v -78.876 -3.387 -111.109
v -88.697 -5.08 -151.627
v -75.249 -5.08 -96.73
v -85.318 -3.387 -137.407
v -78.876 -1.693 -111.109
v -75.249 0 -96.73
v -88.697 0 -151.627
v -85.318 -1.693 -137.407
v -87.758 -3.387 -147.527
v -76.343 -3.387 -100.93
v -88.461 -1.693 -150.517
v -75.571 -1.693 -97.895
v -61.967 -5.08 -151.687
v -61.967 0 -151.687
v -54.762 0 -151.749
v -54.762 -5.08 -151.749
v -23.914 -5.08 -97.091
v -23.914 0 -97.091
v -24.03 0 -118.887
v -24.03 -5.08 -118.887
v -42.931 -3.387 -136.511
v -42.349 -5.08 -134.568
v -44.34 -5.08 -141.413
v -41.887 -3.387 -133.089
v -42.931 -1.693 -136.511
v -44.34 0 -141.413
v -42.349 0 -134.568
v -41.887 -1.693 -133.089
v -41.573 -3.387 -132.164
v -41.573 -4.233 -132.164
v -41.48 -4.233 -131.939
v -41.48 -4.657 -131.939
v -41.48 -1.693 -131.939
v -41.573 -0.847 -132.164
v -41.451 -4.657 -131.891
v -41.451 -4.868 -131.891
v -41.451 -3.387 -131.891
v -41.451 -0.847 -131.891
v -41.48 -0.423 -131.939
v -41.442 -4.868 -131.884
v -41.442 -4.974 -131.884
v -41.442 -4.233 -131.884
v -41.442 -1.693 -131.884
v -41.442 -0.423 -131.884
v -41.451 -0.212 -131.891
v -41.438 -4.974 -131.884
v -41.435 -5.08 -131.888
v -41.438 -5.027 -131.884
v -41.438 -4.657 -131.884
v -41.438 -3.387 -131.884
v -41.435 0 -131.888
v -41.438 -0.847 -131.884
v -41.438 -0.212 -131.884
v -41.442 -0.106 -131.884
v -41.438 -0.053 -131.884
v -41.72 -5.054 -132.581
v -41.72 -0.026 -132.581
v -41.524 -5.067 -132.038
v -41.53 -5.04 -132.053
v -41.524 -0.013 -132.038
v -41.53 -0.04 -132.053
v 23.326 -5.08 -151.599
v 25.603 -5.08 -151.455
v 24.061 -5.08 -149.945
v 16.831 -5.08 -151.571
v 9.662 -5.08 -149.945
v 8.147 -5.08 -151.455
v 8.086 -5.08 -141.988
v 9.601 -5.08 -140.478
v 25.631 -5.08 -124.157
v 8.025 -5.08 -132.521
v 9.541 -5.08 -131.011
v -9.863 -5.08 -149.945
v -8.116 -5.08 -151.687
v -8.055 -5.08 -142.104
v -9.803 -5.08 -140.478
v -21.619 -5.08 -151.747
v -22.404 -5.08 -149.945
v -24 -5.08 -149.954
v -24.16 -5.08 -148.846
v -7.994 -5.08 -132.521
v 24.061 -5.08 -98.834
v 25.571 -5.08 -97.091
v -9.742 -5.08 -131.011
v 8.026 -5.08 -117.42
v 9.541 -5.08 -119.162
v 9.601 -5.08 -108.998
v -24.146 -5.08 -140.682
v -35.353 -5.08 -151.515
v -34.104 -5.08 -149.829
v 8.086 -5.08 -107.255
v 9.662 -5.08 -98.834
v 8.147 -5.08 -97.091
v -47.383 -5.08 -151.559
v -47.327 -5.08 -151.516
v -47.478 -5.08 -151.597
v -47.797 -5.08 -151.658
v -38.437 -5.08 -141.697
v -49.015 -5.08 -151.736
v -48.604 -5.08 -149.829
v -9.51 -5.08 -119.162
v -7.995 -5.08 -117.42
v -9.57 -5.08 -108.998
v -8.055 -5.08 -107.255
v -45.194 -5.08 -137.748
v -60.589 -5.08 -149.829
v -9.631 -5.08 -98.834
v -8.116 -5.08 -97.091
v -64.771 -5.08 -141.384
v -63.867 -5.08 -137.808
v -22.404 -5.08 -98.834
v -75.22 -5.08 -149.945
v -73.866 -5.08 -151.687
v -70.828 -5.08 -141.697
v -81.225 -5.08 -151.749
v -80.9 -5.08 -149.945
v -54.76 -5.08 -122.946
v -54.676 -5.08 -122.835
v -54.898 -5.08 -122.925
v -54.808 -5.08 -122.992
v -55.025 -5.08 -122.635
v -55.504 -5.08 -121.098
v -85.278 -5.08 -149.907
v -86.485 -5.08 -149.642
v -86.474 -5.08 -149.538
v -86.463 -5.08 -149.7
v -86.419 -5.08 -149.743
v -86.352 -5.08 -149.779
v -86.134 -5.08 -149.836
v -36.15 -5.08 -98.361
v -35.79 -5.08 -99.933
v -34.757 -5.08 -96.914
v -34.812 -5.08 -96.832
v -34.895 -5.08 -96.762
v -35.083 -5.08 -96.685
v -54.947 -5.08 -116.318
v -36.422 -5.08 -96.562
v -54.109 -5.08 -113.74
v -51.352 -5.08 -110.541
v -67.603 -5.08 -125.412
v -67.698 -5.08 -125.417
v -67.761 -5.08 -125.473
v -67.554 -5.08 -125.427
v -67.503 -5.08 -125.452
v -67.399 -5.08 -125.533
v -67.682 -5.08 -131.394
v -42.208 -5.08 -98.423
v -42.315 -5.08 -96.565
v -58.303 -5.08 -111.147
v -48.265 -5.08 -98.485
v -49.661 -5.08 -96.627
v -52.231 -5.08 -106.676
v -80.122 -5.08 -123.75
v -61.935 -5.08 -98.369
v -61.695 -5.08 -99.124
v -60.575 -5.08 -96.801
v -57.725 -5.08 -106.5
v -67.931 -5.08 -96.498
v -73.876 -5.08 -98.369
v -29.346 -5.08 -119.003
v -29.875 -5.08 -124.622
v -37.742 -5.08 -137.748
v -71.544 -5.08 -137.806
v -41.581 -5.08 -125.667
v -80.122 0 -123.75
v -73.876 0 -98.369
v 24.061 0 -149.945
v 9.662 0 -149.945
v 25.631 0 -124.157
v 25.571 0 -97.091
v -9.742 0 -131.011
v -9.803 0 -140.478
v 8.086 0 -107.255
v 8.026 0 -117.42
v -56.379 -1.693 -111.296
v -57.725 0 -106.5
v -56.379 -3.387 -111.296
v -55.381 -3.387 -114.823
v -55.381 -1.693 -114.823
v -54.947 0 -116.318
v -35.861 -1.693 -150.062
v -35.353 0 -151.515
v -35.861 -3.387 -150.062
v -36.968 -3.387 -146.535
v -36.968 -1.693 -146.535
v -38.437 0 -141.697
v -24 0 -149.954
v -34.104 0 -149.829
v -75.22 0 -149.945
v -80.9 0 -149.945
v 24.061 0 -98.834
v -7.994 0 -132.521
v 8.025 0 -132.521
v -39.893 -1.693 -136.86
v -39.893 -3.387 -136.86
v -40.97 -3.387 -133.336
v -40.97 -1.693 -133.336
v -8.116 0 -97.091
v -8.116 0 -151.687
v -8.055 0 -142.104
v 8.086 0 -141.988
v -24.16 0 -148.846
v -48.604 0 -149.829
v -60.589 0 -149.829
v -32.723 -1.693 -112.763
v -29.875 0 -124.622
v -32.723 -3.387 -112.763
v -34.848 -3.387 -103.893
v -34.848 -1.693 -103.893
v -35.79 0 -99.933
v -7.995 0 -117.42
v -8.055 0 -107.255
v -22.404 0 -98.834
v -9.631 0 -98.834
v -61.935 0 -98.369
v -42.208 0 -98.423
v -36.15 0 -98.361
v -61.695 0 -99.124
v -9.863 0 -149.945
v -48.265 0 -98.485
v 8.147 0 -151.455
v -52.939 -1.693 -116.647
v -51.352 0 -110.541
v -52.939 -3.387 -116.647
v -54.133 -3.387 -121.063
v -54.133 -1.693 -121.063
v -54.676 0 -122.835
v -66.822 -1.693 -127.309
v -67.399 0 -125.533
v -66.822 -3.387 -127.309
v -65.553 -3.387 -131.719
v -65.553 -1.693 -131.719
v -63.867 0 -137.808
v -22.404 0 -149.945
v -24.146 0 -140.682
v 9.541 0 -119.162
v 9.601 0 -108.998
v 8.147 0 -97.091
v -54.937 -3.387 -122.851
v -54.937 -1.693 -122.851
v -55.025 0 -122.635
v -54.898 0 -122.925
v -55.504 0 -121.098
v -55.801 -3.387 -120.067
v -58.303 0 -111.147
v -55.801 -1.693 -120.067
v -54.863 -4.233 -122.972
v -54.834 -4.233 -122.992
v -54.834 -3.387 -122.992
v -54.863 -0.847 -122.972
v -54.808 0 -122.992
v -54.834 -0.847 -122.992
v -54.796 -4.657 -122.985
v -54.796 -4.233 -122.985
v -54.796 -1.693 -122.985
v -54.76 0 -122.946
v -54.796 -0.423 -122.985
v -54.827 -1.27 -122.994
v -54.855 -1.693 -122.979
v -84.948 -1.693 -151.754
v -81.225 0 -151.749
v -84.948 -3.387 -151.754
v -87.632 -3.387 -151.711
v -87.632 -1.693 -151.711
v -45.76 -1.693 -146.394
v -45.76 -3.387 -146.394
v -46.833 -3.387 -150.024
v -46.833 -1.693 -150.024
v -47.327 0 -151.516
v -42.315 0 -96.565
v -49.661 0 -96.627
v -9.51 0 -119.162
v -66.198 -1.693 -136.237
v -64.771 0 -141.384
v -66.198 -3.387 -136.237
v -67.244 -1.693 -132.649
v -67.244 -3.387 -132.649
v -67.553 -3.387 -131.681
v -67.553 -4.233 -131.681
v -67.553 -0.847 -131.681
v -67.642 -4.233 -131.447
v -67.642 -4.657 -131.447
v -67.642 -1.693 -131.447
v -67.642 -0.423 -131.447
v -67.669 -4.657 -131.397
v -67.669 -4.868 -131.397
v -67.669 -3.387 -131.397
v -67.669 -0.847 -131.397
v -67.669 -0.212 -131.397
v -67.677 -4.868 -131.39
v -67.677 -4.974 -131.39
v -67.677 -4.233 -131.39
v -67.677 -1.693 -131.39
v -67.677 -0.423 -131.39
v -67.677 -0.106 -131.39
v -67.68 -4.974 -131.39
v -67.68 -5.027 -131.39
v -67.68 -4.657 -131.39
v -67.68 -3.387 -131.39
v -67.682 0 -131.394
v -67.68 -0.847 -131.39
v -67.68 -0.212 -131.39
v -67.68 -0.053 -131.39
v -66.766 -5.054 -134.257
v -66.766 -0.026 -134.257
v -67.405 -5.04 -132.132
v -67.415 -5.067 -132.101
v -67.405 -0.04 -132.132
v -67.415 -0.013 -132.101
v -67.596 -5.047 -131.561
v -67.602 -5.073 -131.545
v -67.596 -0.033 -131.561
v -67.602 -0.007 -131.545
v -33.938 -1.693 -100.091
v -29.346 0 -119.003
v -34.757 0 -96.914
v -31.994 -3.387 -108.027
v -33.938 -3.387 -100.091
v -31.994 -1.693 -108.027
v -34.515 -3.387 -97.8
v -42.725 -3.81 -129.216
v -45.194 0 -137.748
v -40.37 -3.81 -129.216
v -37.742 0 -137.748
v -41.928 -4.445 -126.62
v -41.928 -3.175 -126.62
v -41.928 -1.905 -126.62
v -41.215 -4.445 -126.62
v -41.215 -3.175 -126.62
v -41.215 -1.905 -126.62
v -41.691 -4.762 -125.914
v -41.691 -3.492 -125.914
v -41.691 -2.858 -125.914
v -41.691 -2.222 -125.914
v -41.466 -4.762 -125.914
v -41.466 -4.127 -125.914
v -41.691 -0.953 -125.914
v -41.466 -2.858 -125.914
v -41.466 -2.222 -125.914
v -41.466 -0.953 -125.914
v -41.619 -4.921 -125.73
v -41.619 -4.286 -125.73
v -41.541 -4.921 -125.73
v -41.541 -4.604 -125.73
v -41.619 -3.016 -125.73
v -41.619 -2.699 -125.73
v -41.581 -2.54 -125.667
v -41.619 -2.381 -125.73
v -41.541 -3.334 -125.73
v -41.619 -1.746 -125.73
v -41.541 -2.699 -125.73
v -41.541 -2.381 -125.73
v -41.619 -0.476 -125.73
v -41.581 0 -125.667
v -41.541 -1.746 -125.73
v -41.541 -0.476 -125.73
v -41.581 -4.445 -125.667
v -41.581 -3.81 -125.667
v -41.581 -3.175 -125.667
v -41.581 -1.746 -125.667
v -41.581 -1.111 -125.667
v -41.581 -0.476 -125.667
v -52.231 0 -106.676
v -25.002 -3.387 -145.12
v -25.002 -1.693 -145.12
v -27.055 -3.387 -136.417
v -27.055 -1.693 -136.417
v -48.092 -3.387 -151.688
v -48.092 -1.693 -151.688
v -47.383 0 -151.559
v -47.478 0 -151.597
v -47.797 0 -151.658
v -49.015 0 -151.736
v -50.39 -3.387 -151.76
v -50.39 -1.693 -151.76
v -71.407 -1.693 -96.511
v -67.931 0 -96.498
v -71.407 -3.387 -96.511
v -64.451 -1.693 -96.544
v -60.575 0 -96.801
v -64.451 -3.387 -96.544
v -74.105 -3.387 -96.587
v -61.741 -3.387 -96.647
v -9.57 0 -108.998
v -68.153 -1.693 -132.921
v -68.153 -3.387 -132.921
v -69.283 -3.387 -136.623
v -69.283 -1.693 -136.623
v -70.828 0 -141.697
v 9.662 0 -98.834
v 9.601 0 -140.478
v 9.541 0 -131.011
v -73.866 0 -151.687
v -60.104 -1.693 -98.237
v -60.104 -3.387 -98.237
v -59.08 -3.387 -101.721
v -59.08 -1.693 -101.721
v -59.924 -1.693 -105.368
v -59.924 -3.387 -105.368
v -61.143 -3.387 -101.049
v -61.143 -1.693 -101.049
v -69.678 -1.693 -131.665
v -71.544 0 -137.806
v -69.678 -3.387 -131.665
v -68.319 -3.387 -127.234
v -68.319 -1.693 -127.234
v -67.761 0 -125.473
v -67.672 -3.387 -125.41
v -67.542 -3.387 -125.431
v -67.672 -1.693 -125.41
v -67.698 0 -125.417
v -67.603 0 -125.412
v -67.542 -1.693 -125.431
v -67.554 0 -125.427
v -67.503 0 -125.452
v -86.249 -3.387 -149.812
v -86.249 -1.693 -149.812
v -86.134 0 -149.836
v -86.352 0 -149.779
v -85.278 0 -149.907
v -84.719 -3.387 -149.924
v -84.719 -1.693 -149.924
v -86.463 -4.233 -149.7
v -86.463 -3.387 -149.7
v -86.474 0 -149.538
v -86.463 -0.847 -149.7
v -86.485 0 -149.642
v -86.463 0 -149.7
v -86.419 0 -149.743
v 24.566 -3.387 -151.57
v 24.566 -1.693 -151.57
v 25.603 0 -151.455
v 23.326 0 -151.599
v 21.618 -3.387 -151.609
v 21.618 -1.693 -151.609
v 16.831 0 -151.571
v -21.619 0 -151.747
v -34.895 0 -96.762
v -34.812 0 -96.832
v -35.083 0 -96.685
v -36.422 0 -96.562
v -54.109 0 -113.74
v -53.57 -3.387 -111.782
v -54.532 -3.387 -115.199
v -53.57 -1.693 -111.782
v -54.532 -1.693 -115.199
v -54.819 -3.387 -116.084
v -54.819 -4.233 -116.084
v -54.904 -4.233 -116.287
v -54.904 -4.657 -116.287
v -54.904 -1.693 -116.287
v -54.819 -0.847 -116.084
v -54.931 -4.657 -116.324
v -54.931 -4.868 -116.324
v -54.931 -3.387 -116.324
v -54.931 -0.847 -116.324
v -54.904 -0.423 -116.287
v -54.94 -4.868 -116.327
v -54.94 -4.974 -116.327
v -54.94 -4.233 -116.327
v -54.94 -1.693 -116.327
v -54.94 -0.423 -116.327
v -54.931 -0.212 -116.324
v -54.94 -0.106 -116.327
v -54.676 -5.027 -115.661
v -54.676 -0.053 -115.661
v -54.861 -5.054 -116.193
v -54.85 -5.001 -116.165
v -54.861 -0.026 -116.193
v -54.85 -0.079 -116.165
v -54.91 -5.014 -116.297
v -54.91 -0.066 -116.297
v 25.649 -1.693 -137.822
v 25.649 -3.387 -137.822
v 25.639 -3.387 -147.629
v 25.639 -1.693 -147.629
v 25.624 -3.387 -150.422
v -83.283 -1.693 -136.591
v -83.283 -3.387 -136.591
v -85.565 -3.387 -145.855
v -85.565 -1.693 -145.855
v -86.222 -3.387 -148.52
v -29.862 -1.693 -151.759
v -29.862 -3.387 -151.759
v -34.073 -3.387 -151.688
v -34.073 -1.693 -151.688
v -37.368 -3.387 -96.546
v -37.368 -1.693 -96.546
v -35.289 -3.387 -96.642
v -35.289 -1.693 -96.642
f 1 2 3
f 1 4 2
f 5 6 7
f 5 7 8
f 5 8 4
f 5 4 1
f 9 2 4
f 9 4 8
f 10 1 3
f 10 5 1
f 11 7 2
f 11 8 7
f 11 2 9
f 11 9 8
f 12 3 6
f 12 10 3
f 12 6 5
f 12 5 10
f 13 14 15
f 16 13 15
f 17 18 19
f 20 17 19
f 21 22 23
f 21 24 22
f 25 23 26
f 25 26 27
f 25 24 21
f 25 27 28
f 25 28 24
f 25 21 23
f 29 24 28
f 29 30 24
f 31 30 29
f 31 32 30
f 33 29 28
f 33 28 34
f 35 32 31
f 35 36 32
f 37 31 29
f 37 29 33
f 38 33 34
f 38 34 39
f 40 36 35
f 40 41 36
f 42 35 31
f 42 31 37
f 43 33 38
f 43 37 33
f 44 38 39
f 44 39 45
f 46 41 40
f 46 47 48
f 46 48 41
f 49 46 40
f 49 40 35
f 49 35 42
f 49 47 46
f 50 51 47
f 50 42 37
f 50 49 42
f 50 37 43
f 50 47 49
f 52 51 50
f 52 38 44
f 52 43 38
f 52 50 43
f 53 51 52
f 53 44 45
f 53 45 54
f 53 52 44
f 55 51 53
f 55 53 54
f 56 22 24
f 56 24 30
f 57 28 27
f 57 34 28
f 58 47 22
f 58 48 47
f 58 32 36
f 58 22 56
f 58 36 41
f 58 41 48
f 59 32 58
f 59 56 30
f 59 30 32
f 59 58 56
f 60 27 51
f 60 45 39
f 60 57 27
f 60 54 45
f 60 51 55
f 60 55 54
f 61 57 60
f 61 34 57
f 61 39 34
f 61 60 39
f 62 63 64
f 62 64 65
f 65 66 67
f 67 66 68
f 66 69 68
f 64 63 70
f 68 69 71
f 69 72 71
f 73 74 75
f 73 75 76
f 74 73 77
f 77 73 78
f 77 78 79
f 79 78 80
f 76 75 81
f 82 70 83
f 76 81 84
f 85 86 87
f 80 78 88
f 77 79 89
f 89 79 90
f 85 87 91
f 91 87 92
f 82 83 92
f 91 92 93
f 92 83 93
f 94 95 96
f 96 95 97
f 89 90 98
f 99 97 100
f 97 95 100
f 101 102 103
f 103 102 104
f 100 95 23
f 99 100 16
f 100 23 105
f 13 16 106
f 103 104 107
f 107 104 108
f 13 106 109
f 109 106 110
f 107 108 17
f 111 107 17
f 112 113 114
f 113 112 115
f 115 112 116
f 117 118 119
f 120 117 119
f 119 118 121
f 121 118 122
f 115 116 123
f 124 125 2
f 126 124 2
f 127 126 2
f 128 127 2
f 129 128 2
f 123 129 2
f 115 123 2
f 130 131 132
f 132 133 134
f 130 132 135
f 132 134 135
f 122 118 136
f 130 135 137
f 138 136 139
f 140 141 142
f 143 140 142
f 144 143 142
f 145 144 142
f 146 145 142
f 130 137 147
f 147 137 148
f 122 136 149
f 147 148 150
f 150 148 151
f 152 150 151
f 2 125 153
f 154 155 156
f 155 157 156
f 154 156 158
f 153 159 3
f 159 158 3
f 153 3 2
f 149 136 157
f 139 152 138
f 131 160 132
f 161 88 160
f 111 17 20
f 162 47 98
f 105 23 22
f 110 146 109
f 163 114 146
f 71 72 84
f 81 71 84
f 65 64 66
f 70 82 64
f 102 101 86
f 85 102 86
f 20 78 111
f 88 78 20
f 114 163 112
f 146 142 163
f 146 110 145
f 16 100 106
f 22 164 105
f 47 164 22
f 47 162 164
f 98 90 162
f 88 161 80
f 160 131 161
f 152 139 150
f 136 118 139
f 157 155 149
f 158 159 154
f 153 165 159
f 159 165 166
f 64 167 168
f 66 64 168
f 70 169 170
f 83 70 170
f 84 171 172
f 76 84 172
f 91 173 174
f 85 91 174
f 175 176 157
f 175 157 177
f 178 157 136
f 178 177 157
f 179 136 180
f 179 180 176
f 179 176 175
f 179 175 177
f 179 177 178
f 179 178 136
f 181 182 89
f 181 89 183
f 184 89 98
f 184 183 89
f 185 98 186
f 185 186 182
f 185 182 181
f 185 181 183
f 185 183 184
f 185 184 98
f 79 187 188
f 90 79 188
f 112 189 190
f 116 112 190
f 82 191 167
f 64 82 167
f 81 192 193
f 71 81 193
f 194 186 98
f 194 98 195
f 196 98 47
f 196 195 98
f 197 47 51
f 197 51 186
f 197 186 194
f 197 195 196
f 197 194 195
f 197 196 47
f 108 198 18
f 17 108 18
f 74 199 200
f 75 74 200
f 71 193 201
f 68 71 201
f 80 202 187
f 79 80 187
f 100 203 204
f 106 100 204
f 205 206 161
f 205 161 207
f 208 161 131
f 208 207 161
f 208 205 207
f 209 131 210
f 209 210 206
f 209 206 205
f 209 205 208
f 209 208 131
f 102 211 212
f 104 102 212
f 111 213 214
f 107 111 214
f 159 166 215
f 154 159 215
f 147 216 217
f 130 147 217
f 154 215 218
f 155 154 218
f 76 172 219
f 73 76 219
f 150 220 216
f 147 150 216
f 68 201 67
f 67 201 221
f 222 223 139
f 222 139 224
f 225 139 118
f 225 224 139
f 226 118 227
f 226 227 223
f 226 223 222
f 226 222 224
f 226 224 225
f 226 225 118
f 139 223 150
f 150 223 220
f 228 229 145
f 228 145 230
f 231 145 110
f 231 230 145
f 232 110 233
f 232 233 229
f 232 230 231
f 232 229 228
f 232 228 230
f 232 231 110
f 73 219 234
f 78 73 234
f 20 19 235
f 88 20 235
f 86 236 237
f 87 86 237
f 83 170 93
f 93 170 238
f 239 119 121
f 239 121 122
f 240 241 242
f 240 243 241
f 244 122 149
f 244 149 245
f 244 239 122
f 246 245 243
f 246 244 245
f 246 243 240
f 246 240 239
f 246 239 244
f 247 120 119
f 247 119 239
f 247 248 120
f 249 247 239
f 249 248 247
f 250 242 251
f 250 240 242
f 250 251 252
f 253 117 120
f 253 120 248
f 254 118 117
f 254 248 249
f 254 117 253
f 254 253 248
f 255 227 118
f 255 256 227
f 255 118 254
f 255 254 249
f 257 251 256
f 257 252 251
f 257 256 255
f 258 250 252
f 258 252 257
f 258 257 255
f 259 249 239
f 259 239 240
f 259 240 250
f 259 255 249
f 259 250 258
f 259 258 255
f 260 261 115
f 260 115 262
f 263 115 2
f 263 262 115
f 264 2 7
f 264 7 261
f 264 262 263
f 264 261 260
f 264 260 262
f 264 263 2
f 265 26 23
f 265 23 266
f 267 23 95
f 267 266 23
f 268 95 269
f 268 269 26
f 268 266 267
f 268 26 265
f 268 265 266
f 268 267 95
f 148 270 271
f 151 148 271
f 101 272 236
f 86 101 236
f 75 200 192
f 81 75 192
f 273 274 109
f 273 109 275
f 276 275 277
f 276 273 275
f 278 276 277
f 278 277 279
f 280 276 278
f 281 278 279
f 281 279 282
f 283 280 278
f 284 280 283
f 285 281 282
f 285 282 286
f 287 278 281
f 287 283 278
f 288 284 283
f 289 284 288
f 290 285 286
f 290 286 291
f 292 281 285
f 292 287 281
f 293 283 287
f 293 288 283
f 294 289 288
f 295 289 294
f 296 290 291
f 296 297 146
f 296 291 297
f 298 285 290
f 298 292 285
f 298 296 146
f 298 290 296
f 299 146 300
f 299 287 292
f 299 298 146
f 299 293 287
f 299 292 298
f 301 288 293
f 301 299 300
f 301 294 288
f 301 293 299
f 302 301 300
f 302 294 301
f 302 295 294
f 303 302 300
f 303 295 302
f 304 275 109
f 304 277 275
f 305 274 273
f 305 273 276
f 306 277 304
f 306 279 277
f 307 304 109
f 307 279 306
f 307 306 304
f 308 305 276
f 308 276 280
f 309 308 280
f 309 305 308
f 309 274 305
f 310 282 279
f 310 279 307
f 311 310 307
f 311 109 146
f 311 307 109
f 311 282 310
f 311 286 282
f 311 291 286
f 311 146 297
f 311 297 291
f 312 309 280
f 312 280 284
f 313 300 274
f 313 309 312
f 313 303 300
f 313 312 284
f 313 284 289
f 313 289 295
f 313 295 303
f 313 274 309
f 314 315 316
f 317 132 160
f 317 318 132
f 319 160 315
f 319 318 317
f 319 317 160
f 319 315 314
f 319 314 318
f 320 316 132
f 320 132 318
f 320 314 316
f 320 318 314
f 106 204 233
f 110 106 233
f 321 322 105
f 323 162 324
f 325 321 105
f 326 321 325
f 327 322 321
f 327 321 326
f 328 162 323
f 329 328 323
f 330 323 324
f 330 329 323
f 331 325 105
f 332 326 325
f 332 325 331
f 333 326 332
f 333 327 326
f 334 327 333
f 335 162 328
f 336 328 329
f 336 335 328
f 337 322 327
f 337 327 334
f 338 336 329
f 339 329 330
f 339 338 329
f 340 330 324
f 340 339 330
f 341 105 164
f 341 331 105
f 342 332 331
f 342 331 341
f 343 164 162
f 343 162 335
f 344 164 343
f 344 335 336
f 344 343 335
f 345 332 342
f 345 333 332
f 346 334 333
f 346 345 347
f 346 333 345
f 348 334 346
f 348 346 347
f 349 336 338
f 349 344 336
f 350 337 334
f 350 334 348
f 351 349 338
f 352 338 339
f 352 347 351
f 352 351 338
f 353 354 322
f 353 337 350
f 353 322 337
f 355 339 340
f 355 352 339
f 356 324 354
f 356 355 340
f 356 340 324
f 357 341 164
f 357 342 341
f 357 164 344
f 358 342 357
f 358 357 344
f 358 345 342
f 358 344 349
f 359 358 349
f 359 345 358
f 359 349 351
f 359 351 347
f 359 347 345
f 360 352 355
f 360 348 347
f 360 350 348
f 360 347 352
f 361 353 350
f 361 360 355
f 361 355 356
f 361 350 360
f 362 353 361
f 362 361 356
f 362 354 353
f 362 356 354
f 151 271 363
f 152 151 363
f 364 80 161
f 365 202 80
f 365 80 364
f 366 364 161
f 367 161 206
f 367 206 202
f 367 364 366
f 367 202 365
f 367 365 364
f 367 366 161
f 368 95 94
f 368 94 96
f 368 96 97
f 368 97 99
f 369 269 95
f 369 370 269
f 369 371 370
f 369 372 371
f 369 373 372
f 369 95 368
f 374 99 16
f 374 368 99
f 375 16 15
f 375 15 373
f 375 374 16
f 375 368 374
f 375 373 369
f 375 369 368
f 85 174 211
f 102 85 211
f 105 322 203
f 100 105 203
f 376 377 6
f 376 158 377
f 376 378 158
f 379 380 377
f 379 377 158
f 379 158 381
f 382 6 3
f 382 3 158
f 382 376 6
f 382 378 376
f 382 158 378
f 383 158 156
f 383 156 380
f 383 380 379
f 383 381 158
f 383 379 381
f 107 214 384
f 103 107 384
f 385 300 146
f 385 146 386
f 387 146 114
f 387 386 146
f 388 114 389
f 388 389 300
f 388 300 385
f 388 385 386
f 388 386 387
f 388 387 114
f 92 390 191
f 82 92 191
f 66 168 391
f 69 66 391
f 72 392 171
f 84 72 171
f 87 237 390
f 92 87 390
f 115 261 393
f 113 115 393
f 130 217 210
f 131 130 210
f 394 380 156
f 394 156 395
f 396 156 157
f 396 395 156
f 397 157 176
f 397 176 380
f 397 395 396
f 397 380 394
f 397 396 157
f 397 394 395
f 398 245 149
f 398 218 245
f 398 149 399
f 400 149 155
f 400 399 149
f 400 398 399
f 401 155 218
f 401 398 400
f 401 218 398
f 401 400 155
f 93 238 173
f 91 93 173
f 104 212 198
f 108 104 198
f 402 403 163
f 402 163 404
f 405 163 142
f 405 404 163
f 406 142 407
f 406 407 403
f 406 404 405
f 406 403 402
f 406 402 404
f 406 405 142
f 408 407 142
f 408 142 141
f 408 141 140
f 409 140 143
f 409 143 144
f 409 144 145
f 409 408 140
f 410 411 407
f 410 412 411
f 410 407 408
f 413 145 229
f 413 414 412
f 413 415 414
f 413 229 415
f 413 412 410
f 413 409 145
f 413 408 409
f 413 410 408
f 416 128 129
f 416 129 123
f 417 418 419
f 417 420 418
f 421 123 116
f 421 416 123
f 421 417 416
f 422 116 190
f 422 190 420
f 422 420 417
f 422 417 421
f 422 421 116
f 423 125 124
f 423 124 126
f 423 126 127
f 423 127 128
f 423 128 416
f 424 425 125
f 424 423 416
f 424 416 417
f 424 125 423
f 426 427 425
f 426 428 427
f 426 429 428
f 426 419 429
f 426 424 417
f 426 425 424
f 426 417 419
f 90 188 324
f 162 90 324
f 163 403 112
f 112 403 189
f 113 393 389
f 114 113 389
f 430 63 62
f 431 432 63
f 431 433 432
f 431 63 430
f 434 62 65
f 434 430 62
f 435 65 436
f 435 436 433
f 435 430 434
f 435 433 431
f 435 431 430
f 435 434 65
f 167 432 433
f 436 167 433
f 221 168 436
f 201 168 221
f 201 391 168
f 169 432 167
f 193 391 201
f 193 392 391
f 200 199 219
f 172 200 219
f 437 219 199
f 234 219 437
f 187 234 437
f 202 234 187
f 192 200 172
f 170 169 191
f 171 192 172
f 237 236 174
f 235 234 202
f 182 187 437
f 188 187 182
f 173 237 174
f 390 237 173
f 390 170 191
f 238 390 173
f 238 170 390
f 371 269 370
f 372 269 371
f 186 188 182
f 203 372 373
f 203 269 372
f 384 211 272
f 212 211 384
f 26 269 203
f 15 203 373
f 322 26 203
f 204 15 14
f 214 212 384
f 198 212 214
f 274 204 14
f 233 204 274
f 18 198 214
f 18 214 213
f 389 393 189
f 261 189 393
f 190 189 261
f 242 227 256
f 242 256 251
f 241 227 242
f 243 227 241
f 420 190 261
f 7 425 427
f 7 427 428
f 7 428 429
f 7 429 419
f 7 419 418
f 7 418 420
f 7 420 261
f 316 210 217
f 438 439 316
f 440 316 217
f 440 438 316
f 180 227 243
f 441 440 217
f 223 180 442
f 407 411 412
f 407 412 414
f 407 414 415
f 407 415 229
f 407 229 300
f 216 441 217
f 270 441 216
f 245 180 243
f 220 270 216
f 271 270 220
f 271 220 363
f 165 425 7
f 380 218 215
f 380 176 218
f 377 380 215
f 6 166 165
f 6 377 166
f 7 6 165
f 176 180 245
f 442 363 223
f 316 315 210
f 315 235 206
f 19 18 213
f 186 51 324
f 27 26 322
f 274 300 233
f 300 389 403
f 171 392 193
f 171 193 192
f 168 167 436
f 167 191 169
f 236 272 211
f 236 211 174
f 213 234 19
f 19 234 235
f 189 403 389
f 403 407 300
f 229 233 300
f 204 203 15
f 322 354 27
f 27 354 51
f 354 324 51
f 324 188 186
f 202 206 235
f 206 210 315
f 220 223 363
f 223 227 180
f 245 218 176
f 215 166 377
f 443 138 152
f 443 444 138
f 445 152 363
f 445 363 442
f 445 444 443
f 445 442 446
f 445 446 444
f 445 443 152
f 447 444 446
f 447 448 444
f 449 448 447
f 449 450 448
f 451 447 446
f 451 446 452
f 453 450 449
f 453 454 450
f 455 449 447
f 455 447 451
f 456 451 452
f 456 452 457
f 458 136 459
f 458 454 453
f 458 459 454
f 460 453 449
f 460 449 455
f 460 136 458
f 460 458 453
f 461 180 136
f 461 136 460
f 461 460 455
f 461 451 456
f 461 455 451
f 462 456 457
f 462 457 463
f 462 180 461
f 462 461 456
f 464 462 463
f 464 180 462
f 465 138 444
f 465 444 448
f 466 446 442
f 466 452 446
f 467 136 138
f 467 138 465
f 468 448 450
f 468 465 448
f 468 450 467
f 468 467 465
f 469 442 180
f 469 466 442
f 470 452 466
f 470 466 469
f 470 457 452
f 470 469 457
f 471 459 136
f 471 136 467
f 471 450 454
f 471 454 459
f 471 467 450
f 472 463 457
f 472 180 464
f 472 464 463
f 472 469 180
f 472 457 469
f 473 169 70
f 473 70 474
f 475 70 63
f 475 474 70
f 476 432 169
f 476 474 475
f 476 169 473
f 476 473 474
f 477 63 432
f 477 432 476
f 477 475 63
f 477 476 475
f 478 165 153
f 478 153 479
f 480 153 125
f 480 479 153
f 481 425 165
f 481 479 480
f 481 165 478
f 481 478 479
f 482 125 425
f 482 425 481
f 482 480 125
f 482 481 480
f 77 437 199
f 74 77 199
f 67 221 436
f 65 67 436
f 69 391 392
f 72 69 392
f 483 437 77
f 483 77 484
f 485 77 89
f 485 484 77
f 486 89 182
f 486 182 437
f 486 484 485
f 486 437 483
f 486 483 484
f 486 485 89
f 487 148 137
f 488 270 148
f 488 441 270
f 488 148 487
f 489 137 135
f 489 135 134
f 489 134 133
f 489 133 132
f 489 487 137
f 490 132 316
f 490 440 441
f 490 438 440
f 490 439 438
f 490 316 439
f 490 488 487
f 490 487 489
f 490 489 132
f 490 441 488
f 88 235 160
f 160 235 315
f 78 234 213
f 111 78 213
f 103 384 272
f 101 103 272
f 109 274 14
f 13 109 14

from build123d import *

# Parameters (mm, degrees)
F1_DEPTH = 5.08


with BuildPart() as f1:
    # F0 (on Front) → F1 (new body)
    with BuildSketch(Plane.XZ):
        with BuildLine():
            add(Edge.make_bspline(
                [(-88.697367137, -151.6268995181), (-88.8096869402, -151.4451622066), (-75.5090993087, -97.1505766968), (-75.2492718061, -96.7301671852)],
                knots=[0, 0, 0, 0, 1, 1, 1, 1], degree=3))
            add(Edge.make_bspline(
                [(-81.2252771404, -151.7485828201), (-85.2727205926, -151.7823095151), (-88.6351599598, -151.727558088), (-88.697367137, -151.6268995181)],
                knots=[0, 0, 0, 0, 1, 1, 1, 1], degree=3))
            Line((-81.2252771404, -151.7485828201), (-73.8662922876, -151.6872587675))
            Line((-73.8662922876, -151.6872587675), (-70.8277989917, -141.6973681422))
            add(Edge.make_bspline(
                [(-67.6823091824, -131.3943521191), (-67.7411591055, -131.5665717782), (-69.1566280625, -136.202929372), (-70.8277989917, -141.6973681422)],
                knots=[0, 0, 0, 0, 1, 1, 1, 1], degree=3))
            add(Edge.make_bspline(
                [(-64.7710364528, -141.3842427444), (-66.3133869912, -135.7175812475), (-67.6234592594, -131.2221309262), (-67.6823091824, -131.3943521191)],
                knots=[0, 0, 0, 0, 1, 1, 1, 1], degree=3))
            Line((-64.7710364528, -141.3842427444), (-61.9667602367, -151.6872587675))
            Line((-61.9667602367, -151.6872587675), (-54.7617960796, -151.7486058281))
            add(Edge.make_bspline(
                [(-47.327106009, -151.5162830756), (-47.50533383, -151.7441177296), (-49.1720212624, -151.796198692), (-54.7617960796, -151.7486058281)],
                knots=[0, 0, 0, 0, 1, 1, 1, 1], degree=3))
            add(Edge.make_bspline(
                [(-44.3397073984, -141.4129659612), (-45.8564269984, -146.8082708266), (-47.2007536122, -151.3547652154), (-47.327106009, -151.5162830756)],
                knots=[0, 0, 0, 0, 1, 1, 1, 1], degree=3))
            add(Edge.make_bspline(
                [(-41.434975083, -131.8877223747), (-41.5158590234, -131.7313015586), (-42.8229893322, -136.0176626297), (-44.3397073984, -141.4129659612)],
                knots=[0, 0, 0, 0, 1, 1, 1, 1], degree=3))
            add(Edge.make_bspline(
                [(-38.4365004097, -141.6973681422), (-40.0047779231, -136.4584856268), (-41.3540942103, -132.0441447246), (-41.434975083, -131.8877223747)],
                knots=[0, 0, 0, 0, 1, 1, 1, 1], degree=3))
            add(Edge.make_bspline(
                [(-35.35325344, -151.5148749846), (-35.4807623735, -151.3541301939), (-36.8682228963, -146.9362537254), (-38.4365004097, -141.6973681422)],
                knots=[0, 0, 0, 0, 1, 1, 1, 1], degree=3))
            add(Edge.make_bspline(
                [(-21.618593749, -151.747197737), (-32.2466686649, -151.7943779904), (-35.1707783378, -151.744881596), (-35.35325344, -151.5148749846)],
                knots=[0, 0, 0, 0, 1, 1, 1, 1], degree=3))
            Line((-21.618593749, -151.747197737), (-8.1157690404, -151.6872587675))
            Line((-8.1157690404, -151.6872587675), (-8.0551122205, -142.1039337259))
            Line((-8.0551122205, -142.1039337259), (-7.994452333, -132.5206102182))
            Line((-7.994452333, -132.5206102182), (0.0155073543, -132.5206102182))
            Line((0.0155073543, -132.5206102182), (8.0254655077, -132.5206102182))
            Line((8.0254655077, -132.5206102182), (8.0861545387, -141.9877738836))
            Line((8.0861545387, -141.9877738836), (8.1468328327, -151.4549360151))
            Line((8.1468328327, -151.4549360151), (16.8305932312, -151.5710973913))
            add(Edge.make_bspline(
                [(25.602503504, -151.4549360151), (25.5448131854, -151.6069745696), (22.5134799865, -151.6471159016), (16.8305932312, -151.5710973913)],
                knots=[0, 0, 0, 0, 1, 1, 1, 1], degree=3))
            add(Edge.make_bspline(
                [(25.6308616602, -124.1569819276), (25.6637462615, -139.0430796988), (25.6509768084, -151.3271586547), (25.602503504, -151.4549360151)],
                knots=[0, 0, 0, 0, 1, 1, 1, 1], degree=3))
            Line((25.6308616602, -124.1569819276), (25.5710607389, -97.0913505925))
            Line((25.5710607389, -97.0913505925), (16.8589513874, -97.0913505925))
            Line((16.8589513874, -97.0913505925), (8.1468328327, -97.0913505925))
            Line((8.1468328327, -97.0913505925), (8.0863155949, -107.25548194))
            Line((8.0863155949, -107.25548194), (8.0257891539, -117.4196144379))
            Line((8.0257891539, -117.4196144379), (0.0155349639, -117.4196144379))
            Line((0.0155349639, -117.4196144379), (-7.9947238277, -117.4196144379))
            Line((-7.9947238277, -117.4196144379), (-8.055247201, -107.25548194))
            Line((-8.055247201, -107.25548194), (-8.1157690404, -97.0913505925))
            Line((-8.1157690404, -97.0913505925), (-16.0147518261, -97.0913505925))
            Line((-16.0147518261, -97.0913505925), (-23.9137330779, -97.0913505925))
            Line((-23.9137330779, -97.0913505925), (-24.029895988, -118.8869035998))
            Line((-24.029895988, -118.8869035998), (-24.1460573642, -140.682456607))
            Line((-24.1460573642, -140.682456607), (-29.34602871, -119.003064976))
            add(Edge.make_bspline(
                [(-34.7574514629, -96.9138580697), (-34.6411535724, -97.1392555987), (-32.206013487, -107.0794001925), (-29.34602871, -119.003064976)],
                knots=[0, 0, 0, 0, 1, 1, 1, 1], degree=3))
            add(Edge.make_bspline(
                [(-42.3147712321, -96.5653737493), (-35.4953141815, -96.5084380938), (-34.9537513196, -96.5334106193), (-34.7574514629, -96.9138580697)],
                knots=[0, 0, 0, 0, 1, 1, 1, 1], degree=3))
            Line((-42.3147712321, -96.5653737493), (-49.6606411279, -96.6267045125))
            Line((-49.6606411279, -96.6267045125), (-52.2309748268, -106.6762014496))
            add(Edge.make_bspline(
                [(-54.9470536187, -116.3176067958), (-54.8637032182, -116.5509909851), (-53.7009344533, -112.4234481661), (-52.2309748268, -106.6762014496)],
                knots=[0, 0, 0, 0, 1, 1, 1, 1], degree=3))
            add(Edge.make_bspline(
                [(-57.7247095515, -106.5004324194), (-56.2771582062, -111.6754283637), (-55.0272151072, -116.0931558553), (-54.9470536187, -116.3176067958)],
                knots=[0, 0, 0, 0, 1, 1, 1, 1], degree=3))
            add(Edge.make_bspline(
                [(-60.5752196243, -96.8009467685), (-60.4549888956, -96.9606688526), (-59.172257829, -101.3254374338), (-57.7247095515, -106.5004324194)],
                knots=[0, 0, 0, 0, 1, 1, 1, 1], degree=3))
            add(Edge.make_bspline(
                [(-75.2492718061, -96.7301671852), (-75.0293705104, -96.3743622869), (-60.8448337816, -96.4427814387), (-60.5752196243, -96.8009467685)],
                knots=[0, 0, 0, 0, 1, 1, 1, 1], degree=3))
        make_face()
        with BuildLine():
            add(Edge.make_bspline(
                [(-71.5440418374, -137.8059582044), (-69.5220890449, -131.1295757823), (-67.8197054306, -125.5795634317), (-67.7609690139, -125.4725960617)],
                knots=[0, 0, 0, 0, 1, 1, 1, 1], degree=3))
            Line((-71.5440418374, -137.8059582044), (-75.2203236858, -149.9448365905))
            Line((-75.2203236858, -149.9448365905), (-80.8996503329, -149.9448365905))
            add(Edge.make_bspline(
                [(-86.4738924333, -149.5382710068), (-86.5718489025, -149.9172545717), (-86.1936823142, -149.9448365905), (-80.8996503329, -149.9448365905)],
                knots=[0, 0, 0, 0, 1, 1, 1, 1], degree=3))
            add(Edge.make_bspline(
                [(-80.122365283, -123.7504163439), (-83.5579088109, -137.7101251841), (-86.4160974282, -149.3146590921), (-86.4738924333, -149.5382710068)],
                knots=[0, 0, 0, 0, 1, 1, 1, 1], degree=3))
            Line((-80.122365283, -123.7504163439), (-73.8759219124, -98.369127073))
            Line((-73.8759219124, -98.369127073), (-67.9052507966, -98.369127073))
            Line((-67.9052507966, -98.369127073), (-61.9345796809, -98.369127073))
            Line((-61.9345796809, -98.369127073), (-61.695405139, -99.1241769771))
            add(Edge.make_bspline(
                [(-58.3028858485, -111.1468934117), (-60.0372260738, -104.9496764748), (-61.563862132, -99.5394543572), (-61.695405139, -99.1241769771)],
                knots=[0, 0, 0, 0, 1, 1, 1, 1], degree=3))
            add(Edge.make_bspline(
                [(-54.6758104934, -122.835249193), (-54.9802894759, -123.1397297094), (-54.6369790849, -124.2460643938), (-58.3028858485, -111.1468934117)],
                knots=[0, 0, 0, 0, 1, 1, 1, 1], degree=3))
            add(Edge.make_bspline(
                [(-51.3516940574, -110.5413640257), (-53.0491616239, -117.1722030235), (-54.5450114125, -122.704451646), (-54.6758104934, -122.835249193)],
                knots=[0, 0, 0, 0, 1, 1, 1, 1], degree=3))
            Line((-51.3516940574, -110.5413640257), (-48.2653946899, -98.485288641))
            Line((-48.2653946899, -98.485288641), (-42.2075339013, -98.4233886209))
            Line((-42.2075339013, -98.4233886209), (-36.1496731128, -98.3614884092))
            Line((-36.1496731128, -98.3614884092), (-35.7901129215, -99.9334880456))
            add(Edge.make_bspline(
                [(-29.8753911839, -124.6216274325), (-32.9307309547, -111.9077511161), (-35.59235589, -100.7980896958), (-35.7901129215, -99.9334880456)],
                knots=[0, 0, 0, 0, 1, 1, 1, 1], degree=3))
            add(Edge.make_bspline(
                [(-24.1601398086, -148.8458736769), (-24.2481884476, -148.2364156708), (-26.8200498792, -137.3355039405), (-29.8753911839, -124.6216274325)],
                knots=[0, 0, 0, 0, 1, 1, 1, 1], degree=3))
            Line((-24.1601398086, -148.8458736769), (-24.0000530474, -149.9539799791))
            Line((-24.0000530474, -149.9539799791), (-29.0522760681, -149.8913275967))
            Line((-29.0522760681, -149.8913275967), (-34.1044990889, -149.8286752143))
            Line((-34.1044990889, -149.8286752143), (-37.7415461214, -137.7478782833))
            add(Edge.make_bspline(
                [(-41.580826013, -125.6670813523), (-41.4695990909, -125.6670813523), (-39.7419219893, -131.1034402013), (-37.7415461214, -137.7478782833)],
                knots=[0, 0, 0, 0, 1, 1, 1, 1], degree=3))
            add(Edge.make_bspline(
                [(-45.1935198194, -137.7478782833), (-43.3177646111, -131.1034402013), (-41.6920514012, -125.6670813523), (-41.580826013, -125.6670813523)],
                knots=[0, 0, 0, 0, 1, 1, 1, 1], degree=3))
            Line((-45.1935198194, -137.7478782833), (-48.6039853683, -149.8286752143))
            Line((-48.6039853683, -149.8286752143), (-54.5967411191, -149.8286752143))
            Line((-54.5967411191, -149.8286752143), (-60.5894953361, -149.8286752143))
            Line((-60.5894953361, -149.8286752143), (-63.8667827745, -137.8084476726))
            add(Edge.make_bspline(
                [(-67.3991233589, -125.5331654511), (-67.2588434384, -125.6734453716), (-65.6692896386, -131.1973221412), (-63.8667827745, -137.8084476726)],
                knots=[0, 0, 0, 0, 1, 1, 1, 1], degree=3))
            add(Edge.make_bspline(
                [(-67.7609690139, -125.4725960617), (-67.7022341309, -125.3656286918), (-67.5394048133, -125.3928855306), (-67.3991233589, -125.5331654511)],
                knots=[0, 0, 0, 0, 1, 1, 1, 1], degree=3))
        make_face(mode=Mode.SUBTRACT)
        Polygon((-9.7420298412, -131.0105107935), (-9.8027173384, -140.4776729251), (-9.8634033017, -149.9448365905), (-16.1335192445, -149.9448365905), (-22.4036336533, -149.9448365905), (-22.4036336533, -124.38930468), (-22.4036336533, -98.8337731531), (-16.0171937443, -98.8337731531), (-9.6307523015, -98.8337731531), (-9.5702289282, -108.9979050758), (-9.5097070888, -119.162036615), (0.0155349639, -119.162036615), (9.5407739489, -119.162036615), (9.6013003899, -108.9979050758), (9.6618176277, -98.8337731531), (16.8613963734, -98.8337731531), (24.0609674497, -98.8337731531), (24.0609674497, -124.38930468), (24.0609674497, -149.9448365905), (16.8615589634, -149.9448365905), (9.662152011, -149.9448365905), (9.6014629799, -140.4776729251), (9.5407739489, -131.0105107935), (-0.1006279462, -131.0105107935), align=None, mode=Mode.SUBTRACT)
    extrude(amount=F1_DEPTH)


solid = f1.part
